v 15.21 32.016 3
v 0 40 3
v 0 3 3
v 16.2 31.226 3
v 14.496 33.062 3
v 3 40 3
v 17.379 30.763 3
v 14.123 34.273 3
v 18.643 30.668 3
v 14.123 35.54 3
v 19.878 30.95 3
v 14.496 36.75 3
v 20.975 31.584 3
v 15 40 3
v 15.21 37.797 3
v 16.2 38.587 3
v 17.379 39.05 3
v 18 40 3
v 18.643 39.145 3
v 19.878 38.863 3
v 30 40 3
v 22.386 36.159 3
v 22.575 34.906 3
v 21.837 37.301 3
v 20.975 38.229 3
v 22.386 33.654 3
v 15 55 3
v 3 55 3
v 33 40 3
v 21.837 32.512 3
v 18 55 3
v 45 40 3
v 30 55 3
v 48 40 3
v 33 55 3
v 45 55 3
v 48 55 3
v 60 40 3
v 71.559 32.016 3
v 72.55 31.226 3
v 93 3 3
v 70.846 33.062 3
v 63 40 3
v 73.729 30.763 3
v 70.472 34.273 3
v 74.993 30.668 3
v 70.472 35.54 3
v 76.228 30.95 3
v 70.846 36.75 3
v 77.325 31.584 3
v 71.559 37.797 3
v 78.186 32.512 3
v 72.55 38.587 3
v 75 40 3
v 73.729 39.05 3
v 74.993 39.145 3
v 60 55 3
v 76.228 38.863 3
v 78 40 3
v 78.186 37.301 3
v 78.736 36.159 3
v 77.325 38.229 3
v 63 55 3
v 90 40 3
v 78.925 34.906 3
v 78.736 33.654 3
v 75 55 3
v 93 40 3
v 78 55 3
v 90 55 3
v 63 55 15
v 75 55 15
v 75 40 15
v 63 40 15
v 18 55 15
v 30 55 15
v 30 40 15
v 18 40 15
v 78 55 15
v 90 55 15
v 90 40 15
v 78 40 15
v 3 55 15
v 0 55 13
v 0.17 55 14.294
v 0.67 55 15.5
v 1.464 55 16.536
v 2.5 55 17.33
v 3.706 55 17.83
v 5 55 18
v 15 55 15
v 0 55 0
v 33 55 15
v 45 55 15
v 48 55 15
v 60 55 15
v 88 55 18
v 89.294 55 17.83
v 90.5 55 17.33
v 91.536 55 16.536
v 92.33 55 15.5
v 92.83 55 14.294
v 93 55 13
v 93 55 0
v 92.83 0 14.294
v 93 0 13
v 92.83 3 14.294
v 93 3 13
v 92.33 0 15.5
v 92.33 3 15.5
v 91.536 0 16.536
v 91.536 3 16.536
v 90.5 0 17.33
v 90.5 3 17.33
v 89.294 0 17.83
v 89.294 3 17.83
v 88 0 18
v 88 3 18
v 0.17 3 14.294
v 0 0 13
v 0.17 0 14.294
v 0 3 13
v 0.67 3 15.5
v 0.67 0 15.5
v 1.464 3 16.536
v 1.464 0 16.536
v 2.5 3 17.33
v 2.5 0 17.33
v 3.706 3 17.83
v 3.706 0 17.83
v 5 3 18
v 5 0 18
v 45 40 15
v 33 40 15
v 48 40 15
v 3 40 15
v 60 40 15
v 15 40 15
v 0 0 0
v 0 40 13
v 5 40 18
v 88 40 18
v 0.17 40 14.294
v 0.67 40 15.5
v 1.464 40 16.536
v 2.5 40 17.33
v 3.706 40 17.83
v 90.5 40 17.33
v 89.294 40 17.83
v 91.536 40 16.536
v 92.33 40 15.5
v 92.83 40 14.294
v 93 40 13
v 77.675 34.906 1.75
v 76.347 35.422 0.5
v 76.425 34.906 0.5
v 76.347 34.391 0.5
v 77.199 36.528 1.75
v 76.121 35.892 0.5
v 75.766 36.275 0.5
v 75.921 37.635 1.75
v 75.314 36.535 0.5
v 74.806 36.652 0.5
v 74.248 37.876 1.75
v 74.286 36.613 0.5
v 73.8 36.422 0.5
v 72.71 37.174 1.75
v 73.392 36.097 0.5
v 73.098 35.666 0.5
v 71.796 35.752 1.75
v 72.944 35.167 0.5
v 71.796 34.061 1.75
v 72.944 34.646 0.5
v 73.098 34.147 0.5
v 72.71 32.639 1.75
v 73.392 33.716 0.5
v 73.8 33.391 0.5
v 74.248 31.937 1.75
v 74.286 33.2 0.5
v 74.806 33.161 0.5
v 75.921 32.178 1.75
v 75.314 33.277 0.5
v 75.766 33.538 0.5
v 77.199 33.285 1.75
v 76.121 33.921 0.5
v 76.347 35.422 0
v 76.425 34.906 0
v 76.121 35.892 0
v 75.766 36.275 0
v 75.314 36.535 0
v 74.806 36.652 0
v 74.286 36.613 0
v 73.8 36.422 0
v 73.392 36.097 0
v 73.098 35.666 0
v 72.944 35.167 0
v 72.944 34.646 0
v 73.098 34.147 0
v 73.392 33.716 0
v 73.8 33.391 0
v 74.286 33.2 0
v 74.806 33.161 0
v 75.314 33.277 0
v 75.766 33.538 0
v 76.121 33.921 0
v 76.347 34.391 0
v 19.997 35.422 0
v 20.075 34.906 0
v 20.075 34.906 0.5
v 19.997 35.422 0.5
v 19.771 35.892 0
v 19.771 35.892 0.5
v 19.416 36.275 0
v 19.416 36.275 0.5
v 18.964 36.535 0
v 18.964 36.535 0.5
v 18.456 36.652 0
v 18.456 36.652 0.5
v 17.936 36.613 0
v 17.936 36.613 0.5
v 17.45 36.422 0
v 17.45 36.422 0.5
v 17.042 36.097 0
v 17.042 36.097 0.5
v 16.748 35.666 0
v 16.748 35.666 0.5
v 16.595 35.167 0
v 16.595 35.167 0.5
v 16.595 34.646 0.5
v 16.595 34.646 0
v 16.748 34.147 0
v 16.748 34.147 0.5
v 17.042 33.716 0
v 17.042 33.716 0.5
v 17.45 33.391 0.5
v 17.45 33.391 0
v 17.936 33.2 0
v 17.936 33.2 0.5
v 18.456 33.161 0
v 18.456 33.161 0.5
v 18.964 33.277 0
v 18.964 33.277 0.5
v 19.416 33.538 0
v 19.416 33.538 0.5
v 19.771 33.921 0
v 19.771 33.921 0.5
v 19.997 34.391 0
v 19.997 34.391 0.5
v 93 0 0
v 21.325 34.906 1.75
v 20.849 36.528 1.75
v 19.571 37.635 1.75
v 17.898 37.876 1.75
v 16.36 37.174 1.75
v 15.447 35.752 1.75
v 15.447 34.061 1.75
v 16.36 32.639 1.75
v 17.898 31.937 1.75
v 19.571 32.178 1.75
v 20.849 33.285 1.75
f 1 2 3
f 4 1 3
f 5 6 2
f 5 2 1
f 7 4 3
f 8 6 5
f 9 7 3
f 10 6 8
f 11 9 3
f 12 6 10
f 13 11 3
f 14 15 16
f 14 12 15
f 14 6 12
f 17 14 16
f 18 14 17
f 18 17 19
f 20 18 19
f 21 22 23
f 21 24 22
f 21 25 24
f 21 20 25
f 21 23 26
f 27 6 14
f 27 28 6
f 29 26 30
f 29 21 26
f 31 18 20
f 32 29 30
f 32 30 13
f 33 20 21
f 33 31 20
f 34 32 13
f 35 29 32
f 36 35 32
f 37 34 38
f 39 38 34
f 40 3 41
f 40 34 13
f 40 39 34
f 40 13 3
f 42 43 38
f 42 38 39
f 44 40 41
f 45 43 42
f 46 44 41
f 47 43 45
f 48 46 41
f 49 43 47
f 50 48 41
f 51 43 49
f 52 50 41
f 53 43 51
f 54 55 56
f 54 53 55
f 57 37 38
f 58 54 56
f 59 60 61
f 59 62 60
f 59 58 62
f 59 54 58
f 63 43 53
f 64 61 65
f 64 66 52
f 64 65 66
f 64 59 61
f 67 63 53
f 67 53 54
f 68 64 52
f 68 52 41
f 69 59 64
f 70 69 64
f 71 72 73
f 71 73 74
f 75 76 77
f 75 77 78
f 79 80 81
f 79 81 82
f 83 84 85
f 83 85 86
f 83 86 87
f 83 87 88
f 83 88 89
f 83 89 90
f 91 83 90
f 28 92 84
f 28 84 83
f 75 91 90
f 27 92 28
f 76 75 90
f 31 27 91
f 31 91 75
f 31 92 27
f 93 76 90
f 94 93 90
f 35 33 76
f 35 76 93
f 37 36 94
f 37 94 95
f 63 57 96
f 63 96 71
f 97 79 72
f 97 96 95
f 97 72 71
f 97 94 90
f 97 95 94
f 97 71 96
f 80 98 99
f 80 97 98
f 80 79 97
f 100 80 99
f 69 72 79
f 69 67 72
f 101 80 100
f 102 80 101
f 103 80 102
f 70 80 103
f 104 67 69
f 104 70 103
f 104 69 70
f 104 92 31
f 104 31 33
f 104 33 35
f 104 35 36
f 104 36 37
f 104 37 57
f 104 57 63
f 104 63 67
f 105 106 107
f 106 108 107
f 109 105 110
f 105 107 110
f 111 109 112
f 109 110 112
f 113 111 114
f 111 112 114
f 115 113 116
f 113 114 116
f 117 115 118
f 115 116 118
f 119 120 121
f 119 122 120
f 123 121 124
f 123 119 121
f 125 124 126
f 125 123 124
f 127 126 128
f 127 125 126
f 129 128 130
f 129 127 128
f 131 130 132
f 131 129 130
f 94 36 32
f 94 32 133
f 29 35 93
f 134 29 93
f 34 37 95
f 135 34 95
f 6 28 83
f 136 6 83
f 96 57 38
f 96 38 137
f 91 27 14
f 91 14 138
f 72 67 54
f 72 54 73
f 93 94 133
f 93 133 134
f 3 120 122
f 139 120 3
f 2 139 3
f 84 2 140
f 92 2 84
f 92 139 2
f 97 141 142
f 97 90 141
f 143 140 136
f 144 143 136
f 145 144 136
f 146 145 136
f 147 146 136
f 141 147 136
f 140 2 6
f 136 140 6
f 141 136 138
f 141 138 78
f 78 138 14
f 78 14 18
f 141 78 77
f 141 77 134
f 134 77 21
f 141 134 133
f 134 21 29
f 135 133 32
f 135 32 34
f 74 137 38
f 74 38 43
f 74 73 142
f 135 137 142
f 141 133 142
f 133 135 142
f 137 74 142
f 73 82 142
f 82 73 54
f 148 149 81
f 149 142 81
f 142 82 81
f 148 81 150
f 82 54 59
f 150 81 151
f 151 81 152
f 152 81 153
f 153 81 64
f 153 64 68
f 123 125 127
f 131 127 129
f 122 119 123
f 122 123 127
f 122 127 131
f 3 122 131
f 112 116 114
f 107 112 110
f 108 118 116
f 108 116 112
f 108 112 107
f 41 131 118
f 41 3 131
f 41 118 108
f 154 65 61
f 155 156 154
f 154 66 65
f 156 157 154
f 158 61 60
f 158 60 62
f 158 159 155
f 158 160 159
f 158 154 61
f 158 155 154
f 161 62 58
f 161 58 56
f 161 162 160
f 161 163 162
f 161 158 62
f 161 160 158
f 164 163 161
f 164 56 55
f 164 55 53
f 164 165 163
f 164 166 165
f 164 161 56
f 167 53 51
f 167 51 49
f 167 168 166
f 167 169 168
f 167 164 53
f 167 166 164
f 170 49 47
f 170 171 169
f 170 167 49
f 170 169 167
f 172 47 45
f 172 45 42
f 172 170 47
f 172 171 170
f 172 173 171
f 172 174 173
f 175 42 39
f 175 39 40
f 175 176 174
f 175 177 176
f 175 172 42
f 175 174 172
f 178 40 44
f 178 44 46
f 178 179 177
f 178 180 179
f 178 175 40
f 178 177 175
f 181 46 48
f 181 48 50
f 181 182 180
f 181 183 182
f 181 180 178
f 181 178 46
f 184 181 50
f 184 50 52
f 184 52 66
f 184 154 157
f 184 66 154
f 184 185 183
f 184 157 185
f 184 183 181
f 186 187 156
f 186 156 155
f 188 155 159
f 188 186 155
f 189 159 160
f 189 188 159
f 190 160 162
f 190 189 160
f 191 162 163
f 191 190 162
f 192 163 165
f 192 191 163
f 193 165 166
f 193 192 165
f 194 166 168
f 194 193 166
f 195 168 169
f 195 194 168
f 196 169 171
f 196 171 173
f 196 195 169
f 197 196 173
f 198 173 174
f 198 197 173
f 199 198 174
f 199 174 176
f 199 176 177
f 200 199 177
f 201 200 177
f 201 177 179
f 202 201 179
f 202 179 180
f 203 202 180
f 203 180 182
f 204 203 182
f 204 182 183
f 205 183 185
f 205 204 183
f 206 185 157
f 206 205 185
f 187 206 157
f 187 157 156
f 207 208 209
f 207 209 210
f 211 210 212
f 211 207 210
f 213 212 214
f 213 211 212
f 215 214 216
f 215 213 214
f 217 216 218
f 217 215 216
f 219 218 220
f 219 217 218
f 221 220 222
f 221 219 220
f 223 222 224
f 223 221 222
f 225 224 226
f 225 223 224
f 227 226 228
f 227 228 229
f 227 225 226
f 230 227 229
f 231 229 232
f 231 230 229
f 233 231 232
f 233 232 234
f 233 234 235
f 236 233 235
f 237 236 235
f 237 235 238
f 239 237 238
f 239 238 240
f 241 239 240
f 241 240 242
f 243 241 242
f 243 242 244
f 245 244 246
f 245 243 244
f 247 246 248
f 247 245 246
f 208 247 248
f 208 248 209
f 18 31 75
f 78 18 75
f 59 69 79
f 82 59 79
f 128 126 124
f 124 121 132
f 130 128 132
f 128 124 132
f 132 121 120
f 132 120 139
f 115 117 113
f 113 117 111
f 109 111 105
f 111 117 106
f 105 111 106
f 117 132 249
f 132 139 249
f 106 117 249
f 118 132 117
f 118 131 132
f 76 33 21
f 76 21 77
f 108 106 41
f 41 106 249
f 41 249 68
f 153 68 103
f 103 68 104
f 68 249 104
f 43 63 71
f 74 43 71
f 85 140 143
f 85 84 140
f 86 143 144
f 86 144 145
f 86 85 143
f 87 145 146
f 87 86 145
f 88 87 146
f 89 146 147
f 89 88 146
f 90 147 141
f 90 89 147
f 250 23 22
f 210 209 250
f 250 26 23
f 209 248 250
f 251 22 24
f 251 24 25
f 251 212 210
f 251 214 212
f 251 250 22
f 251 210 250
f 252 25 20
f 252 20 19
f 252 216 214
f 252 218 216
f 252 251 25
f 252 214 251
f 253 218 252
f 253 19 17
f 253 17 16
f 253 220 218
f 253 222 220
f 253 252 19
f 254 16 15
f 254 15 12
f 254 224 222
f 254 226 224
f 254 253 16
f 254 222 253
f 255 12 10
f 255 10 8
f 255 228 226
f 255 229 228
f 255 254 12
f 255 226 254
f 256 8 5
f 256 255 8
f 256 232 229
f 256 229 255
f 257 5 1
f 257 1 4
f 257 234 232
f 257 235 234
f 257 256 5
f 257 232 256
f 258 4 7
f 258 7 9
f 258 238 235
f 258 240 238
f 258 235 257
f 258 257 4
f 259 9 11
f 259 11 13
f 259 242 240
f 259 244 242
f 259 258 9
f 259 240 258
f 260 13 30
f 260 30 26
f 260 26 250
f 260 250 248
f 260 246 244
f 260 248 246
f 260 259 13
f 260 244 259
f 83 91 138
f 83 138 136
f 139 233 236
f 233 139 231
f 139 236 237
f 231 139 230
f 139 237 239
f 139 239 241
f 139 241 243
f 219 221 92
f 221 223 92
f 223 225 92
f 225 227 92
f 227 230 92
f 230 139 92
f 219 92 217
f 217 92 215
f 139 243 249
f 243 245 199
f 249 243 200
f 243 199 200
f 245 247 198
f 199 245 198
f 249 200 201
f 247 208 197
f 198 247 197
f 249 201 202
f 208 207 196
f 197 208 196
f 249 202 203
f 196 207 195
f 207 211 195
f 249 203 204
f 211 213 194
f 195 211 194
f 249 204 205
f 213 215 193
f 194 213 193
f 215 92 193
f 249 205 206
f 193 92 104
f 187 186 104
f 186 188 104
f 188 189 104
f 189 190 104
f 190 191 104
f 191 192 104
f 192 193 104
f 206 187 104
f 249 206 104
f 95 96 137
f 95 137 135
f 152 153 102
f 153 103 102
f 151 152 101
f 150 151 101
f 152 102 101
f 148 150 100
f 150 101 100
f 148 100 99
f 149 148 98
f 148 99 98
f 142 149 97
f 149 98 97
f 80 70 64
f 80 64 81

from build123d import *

# Parameters (mm, degrees)
F0_W     = 93
F0_H     = 55
F0_R     = 1.75
F1_DEPTH = 3
F2_W     = 93
F2_H     = 3
F2_H_2   = 15
F3_DEPTH = 15
F4_W     = 12
F4_H     = 12
F5_DEPTH = 15
F6_SIZE  = 2.5
F7_R     = 5


with BuildPart() as f1:
    # F0 (on Top) → F1 (new body)
    with BuildSketch(Plane.XY):
        with Locations((46.5, 27.5)):
            Rectangle(F0_W, F0_H)
        with Locations((18.325063, 34.906461)):
            Circle(F0_R, mode=Mode.SUBTRACT)
        with Locations((74.674937, 34.906461)):
            Circle(F0_R, mode=Mode.SUBTRACT)
    extrude(amount=F1_DEPTH)

    # F2 (on face) → F3 (join)
    with BuildSketch(Plane.XY.offset(3)):
        with Locations((46.5, 1.5)):
            Rectangle(F2_W, F2_H)
        with Locations((46.5, 47.5)):
            Rectangle(F2_W, F2_H_2)
    extrude(amount=F3_DEPTH)

    # F4 (on face) → F5 (cut, through all)
    with BuildSketch(Plane(origin=(0, 55, 0), x_dir=(-1, 0, 0), z_dir=(0, 1, 0))):
        with Locations((-84, 9)):
            Rectangle(F4_W, F4_H)
        with Locations((-69, 9)):
            Rectangle(F4_W, F4_H)
        with Locations((-54, 9)):
            Rectangle(F4_W, F4_H)
        with Locations((-39, 9)):
            Rectangle(F4_W, F4_H)
        with Locations((-24, 9)):
            Rectangle(F4_W, F4_H)
        with Locations((-9, 9)):
            Rectangle(F4_W, F4_H)
    extrude(amount=-F5_DEPTH, mode=Mode.SUBTRACT)

    # F6
    f6_edges = [f1.edges().sort_by_distance(p)[0] for p in [
        (16.575063, 34.906461, 3),
        (72.924937, 34.906461, 3),
    ]]
    chamfer(f6_edges, length=F6_SIZE)

    # F7
    f7_edges = [f1.edges().sort_by_distance(p)[0] for p in [
        (0, 47.5, 18),
        (93, 47.5, 18),
        (93, 1.5, 18),
        (0, 1.5, 18),
    ]]
    fillet(f7_edges, radius=F7_R)


solid = f1.part
